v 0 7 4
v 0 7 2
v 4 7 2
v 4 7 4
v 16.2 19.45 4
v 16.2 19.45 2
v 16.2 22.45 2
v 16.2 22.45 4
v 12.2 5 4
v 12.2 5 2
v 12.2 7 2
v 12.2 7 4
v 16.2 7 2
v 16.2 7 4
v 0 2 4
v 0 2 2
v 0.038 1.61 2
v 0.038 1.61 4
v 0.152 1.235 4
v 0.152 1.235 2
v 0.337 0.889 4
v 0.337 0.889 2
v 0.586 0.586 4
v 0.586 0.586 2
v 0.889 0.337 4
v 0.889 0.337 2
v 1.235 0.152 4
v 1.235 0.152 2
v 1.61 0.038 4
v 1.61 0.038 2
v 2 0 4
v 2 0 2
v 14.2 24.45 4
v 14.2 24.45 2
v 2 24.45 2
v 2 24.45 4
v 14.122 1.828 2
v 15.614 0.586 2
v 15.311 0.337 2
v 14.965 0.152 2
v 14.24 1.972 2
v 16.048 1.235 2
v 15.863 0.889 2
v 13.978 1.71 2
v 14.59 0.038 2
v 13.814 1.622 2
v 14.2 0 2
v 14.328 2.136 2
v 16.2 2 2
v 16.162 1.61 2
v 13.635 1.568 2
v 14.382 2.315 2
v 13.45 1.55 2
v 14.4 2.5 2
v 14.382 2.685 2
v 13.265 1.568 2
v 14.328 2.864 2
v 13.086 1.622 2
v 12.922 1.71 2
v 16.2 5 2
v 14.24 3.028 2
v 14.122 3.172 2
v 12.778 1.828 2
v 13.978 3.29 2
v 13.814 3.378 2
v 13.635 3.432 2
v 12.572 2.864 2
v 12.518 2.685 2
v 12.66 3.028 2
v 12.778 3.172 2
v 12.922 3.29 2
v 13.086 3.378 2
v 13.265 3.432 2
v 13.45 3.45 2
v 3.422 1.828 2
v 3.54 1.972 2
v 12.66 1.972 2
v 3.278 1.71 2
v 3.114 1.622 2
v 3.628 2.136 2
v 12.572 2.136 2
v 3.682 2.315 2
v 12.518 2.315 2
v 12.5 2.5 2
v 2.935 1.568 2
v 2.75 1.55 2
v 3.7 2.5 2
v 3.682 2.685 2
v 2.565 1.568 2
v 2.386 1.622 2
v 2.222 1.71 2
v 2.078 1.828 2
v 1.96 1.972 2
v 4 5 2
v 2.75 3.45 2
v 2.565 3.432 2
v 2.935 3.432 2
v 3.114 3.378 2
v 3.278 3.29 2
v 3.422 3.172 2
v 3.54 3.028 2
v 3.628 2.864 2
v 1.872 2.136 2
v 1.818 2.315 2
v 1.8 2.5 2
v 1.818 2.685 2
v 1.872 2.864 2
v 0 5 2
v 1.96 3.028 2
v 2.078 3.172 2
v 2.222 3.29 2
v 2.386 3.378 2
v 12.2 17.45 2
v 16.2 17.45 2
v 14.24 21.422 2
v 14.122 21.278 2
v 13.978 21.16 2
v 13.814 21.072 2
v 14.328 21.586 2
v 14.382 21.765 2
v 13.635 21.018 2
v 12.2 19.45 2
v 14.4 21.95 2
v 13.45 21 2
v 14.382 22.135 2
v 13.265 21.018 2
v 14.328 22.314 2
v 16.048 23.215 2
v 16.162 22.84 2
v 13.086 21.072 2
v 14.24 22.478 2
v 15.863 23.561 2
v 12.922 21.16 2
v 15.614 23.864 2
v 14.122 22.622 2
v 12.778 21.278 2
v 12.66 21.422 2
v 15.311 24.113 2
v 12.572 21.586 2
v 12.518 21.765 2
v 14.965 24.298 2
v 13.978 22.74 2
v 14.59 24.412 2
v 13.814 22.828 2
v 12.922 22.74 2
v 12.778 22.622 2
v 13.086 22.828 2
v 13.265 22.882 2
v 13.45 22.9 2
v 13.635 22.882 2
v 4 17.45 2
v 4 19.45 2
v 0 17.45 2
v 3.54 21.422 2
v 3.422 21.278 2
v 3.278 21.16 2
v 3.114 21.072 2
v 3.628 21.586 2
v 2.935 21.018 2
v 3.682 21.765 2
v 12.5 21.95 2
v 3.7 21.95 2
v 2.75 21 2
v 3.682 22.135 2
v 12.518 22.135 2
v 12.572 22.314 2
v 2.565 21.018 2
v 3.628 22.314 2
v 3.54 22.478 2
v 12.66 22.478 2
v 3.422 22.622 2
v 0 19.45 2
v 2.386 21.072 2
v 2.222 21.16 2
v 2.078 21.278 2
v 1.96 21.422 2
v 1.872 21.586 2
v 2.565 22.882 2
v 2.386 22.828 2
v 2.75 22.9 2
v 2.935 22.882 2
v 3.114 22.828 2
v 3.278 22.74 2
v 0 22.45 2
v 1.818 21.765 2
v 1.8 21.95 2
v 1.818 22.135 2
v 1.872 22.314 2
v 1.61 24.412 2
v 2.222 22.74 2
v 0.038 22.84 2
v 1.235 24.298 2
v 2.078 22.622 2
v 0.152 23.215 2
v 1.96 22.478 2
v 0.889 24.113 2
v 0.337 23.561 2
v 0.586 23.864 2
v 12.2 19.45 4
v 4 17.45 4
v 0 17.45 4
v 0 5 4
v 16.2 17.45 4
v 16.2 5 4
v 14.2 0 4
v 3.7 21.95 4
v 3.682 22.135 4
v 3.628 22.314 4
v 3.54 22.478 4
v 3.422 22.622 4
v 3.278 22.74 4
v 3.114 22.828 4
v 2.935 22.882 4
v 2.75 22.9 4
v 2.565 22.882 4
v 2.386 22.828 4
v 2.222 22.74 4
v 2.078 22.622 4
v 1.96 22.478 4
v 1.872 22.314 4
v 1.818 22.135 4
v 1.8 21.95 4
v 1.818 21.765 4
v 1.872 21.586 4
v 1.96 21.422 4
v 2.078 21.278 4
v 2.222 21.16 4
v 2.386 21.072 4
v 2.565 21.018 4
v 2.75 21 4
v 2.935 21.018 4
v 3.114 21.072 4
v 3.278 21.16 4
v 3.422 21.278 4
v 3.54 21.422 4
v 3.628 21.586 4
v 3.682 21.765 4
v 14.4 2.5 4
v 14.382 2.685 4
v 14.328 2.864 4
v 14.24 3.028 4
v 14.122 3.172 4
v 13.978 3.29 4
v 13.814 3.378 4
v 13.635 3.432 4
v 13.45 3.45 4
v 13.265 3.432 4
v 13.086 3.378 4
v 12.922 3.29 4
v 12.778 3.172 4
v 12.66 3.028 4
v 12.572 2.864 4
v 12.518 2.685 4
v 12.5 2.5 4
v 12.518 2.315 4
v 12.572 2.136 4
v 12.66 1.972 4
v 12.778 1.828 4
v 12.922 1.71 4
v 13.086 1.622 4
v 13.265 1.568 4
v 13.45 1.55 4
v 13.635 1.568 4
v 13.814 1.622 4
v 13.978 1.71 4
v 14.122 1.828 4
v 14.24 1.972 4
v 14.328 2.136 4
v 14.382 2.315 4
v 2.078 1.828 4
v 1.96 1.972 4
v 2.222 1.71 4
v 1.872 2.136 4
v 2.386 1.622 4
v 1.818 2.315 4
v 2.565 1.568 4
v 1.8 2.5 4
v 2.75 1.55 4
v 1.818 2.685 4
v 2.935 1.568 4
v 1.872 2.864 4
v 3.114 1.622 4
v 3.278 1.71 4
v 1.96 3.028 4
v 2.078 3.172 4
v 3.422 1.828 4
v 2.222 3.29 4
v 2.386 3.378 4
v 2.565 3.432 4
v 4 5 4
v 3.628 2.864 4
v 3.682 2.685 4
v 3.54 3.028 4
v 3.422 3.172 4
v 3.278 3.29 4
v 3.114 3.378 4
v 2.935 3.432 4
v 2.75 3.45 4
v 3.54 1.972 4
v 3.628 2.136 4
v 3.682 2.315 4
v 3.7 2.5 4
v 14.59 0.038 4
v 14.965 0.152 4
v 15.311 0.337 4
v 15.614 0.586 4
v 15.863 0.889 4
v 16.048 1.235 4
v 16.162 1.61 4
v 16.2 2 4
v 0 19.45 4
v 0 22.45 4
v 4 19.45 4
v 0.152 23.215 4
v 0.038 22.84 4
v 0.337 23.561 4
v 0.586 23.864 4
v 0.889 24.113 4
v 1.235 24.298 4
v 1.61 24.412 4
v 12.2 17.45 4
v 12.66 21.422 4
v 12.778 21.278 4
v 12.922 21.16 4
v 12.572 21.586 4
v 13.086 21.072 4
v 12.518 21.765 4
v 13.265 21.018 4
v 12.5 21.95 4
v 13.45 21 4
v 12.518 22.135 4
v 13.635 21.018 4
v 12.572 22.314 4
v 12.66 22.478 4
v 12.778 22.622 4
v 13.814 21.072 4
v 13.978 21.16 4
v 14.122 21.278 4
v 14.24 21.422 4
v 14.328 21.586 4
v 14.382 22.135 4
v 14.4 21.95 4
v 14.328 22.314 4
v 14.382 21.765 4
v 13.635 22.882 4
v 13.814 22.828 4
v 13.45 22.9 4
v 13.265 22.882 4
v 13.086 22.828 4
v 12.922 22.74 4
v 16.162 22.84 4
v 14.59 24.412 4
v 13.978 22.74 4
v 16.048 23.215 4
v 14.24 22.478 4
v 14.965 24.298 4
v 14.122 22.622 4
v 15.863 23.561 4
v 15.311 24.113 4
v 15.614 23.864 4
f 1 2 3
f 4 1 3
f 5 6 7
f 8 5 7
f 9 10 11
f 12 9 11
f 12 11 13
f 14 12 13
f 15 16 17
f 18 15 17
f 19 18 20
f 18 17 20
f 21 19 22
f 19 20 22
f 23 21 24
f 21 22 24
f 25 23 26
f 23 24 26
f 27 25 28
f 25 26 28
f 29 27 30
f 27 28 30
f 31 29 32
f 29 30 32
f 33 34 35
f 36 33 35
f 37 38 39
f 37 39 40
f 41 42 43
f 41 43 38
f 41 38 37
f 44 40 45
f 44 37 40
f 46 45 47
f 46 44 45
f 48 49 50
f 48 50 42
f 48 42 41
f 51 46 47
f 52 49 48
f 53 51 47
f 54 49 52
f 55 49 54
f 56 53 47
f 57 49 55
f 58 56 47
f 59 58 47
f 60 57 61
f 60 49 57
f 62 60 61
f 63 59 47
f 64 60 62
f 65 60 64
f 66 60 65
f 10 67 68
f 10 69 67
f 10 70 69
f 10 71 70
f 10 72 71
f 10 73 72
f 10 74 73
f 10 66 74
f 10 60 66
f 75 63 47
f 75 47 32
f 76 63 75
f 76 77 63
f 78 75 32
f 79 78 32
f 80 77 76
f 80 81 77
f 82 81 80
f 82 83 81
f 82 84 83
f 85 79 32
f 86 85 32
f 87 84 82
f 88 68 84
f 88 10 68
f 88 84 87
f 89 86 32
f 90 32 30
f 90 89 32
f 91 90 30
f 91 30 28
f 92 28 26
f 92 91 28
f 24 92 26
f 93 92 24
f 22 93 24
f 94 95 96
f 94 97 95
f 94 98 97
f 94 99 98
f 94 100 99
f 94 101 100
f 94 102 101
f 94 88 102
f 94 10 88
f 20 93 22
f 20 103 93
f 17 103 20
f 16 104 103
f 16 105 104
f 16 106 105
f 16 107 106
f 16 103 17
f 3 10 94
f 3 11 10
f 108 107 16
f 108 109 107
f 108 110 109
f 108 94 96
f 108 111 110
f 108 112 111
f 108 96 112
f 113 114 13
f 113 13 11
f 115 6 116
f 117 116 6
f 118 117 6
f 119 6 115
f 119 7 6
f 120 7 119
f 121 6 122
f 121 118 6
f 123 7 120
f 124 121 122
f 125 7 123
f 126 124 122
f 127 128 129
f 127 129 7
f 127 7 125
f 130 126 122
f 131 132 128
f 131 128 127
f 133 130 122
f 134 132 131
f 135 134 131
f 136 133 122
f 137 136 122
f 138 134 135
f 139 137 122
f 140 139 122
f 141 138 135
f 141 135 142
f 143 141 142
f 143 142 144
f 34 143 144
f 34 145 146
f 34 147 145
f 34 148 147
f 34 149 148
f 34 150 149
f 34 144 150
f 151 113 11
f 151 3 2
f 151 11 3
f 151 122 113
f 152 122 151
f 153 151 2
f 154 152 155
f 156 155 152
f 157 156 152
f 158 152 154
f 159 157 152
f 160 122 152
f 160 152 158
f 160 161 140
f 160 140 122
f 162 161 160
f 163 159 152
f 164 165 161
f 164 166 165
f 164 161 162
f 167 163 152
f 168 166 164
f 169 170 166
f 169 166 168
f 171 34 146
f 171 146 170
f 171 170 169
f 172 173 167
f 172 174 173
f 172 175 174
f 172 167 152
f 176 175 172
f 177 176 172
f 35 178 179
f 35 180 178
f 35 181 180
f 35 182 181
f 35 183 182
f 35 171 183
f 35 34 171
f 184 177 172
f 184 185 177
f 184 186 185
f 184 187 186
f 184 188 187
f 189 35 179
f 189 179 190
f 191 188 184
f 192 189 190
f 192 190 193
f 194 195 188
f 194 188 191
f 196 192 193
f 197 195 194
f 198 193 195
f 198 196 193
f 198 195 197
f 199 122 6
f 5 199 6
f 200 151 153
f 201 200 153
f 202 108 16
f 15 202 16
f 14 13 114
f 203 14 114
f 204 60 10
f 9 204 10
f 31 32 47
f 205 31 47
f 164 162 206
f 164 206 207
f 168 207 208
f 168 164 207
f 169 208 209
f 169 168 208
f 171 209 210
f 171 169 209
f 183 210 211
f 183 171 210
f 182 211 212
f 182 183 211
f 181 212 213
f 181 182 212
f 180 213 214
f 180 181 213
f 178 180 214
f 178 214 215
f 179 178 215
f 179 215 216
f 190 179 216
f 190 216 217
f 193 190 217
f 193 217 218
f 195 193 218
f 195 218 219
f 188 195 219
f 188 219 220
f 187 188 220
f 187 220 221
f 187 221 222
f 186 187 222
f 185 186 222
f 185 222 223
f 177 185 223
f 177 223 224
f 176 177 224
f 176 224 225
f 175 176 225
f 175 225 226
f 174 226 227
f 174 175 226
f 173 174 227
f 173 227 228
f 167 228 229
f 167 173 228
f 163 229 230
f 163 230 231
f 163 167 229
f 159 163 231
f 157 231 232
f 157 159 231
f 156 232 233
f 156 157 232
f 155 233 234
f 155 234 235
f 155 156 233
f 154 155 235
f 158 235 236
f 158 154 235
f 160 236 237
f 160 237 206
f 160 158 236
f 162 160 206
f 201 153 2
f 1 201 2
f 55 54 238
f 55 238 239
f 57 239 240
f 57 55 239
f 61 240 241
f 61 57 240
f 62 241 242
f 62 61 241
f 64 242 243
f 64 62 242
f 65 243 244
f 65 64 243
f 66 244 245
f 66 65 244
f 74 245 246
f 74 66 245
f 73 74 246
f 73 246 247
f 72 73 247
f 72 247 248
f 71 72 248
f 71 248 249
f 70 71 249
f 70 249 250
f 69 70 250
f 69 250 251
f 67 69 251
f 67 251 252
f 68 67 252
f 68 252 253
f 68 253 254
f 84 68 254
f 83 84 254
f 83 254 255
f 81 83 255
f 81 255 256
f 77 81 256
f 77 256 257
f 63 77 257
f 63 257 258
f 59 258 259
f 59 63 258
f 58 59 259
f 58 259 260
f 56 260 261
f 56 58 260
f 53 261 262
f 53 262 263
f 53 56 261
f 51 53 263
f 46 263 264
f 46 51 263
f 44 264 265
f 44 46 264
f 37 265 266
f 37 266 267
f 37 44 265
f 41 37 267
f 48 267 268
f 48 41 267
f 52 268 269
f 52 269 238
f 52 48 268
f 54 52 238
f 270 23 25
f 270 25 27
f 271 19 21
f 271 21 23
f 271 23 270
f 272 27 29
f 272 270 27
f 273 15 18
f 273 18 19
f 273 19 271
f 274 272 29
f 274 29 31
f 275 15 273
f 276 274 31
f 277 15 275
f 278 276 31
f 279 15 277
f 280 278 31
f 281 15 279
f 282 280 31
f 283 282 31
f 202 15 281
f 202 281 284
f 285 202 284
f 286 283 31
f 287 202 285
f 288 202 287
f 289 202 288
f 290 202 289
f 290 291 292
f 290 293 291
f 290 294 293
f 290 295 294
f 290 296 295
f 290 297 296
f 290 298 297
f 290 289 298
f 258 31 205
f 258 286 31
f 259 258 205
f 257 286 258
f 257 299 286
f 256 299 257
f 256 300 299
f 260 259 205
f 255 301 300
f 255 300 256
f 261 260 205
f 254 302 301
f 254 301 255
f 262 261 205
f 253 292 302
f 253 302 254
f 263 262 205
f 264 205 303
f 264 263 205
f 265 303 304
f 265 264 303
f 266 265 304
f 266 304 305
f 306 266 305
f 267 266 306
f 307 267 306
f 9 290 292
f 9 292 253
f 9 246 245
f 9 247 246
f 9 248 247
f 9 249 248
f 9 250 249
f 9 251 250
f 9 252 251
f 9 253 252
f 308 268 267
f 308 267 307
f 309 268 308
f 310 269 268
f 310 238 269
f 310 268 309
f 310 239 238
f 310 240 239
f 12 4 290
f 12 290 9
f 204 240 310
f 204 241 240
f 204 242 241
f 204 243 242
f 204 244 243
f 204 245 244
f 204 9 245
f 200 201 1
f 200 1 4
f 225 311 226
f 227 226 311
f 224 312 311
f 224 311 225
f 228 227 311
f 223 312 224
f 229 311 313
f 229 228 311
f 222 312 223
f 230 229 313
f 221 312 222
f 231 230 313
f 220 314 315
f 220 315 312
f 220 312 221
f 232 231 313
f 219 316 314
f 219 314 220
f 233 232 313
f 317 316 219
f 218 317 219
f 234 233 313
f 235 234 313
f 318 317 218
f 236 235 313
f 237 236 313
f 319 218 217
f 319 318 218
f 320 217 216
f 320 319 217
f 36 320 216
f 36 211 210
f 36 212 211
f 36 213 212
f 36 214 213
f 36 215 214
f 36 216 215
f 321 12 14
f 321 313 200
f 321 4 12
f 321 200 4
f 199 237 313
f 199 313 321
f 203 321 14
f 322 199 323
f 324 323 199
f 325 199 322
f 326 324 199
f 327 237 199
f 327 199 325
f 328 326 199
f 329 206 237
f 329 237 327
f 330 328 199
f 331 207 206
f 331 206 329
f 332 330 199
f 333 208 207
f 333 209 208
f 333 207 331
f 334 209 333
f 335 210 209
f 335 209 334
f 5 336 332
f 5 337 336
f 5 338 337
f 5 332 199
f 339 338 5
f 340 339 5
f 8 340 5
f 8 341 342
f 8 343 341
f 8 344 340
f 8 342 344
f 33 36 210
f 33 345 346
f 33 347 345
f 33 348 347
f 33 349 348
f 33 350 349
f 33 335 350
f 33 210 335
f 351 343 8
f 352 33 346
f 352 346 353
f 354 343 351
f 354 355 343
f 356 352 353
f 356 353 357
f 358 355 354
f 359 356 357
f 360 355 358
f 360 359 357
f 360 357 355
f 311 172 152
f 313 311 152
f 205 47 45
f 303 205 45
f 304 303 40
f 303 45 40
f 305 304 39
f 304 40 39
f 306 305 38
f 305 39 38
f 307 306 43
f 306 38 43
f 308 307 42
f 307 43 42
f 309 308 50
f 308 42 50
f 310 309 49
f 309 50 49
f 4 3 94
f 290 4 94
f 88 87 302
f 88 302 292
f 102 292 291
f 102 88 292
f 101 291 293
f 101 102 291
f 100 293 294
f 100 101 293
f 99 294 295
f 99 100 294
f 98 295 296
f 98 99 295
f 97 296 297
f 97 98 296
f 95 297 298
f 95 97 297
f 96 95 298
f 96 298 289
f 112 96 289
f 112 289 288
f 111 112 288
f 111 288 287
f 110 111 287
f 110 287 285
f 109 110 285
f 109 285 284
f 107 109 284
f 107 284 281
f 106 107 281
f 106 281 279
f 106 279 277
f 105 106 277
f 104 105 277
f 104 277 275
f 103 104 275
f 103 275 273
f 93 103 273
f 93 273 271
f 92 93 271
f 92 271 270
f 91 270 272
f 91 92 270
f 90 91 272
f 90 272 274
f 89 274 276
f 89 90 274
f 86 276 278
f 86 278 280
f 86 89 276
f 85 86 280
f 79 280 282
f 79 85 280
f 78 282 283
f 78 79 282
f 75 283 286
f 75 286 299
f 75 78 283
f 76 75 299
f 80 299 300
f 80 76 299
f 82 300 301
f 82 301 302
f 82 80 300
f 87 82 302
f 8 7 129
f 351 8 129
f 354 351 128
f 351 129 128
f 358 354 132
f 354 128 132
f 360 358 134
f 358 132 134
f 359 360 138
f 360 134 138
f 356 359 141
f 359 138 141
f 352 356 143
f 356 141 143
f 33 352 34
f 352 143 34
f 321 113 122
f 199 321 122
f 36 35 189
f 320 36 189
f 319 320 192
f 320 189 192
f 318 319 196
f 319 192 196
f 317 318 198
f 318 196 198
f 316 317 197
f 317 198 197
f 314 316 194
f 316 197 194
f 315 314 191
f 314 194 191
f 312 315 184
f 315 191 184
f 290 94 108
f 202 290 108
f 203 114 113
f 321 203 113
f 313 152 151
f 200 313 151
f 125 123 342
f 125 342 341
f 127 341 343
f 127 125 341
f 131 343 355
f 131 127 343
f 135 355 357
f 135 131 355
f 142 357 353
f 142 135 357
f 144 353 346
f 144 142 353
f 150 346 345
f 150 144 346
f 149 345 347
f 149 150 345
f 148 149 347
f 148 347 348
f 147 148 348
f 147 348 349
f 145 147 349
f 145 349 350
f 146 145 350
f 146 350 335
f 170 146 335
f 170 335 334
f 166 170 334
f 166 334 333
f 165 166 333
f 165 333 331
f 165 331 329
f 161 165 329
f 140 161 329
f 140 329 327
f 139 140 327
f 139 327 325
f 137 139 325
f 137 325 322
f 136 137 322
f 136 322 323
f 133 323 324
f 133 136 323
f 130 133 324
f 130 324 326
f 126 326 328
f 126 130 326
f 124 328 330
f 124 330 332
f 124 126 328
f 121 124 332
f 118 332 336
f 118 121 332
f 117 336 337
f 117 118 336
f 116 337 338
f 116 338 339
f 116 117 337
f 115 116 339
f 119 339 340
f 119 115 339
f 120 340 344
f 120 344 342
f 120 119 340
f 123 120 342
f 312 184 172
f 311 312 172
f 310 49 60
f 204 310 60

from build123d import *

# Parameters (mm, degrees)
SKETCH1_R           = 0.95
BOSS_EXTRUDE1_DEPTH = 4
SKETCH2_W           = 16.2
SKETCH2_H           = 24.45
CUT_EXTRUDE1_DEPTH  = 2


with BuildPart() as part:
    # Sketch1 → Boss-Extrude1 (new body)
    with BuildSketch(Plane.XY):
        with BuildLine():
            Line((0, 17.45), (0, 7))
            Line((0, 7), (4, 7))
            Line((4, 7), (4, 5))
            Line((4, 5), (0, 5))
            Line((0, 5), (0, 2))
            ThreePointArc((0, 2), (0.585786438, 0.585786438), (2, 0))
            Line((2, 0), (14.2, 0))
            ThreePointArc((14.2, 0), (15.614213562, 0.585786438), (16.2, 2))
            Line((16.2, 2), (16.2, 5))
            Line((16.2, 5), (12.2, 5))
            Line((12.2, 5), (12.2, 7))
            Line((12.2, 7), (16.2, 7))
            Line((16.2, 7), (16.2, 17.45))
            Line((16.2, 17.45), (12.2, 17.45))
            Line((12.2, 17.45), (12.2, 19.45))
            Line((12.2, 19.45), (16.2, 19.45))
            Line((16.2, 19.45), (16.2, 22.45))
            ThreePointArc((16.2, 22.45), (15.614213562, 23.864213562), (14.2, 24.45))
            Line((14.2, 24.45), (2, 24.45))
            ThreePointArc((2, 24.45), (0.585786438, 23.864213562), (0, 22.45))
            Line((0, 22.45), (0, 19.45))
            Line((0, 19.45), (4, 19.45))
            Line((4, 19.45), (4, 17.45))
            Line((4, 17.45), (0, 17.45))
        make_face()
        with Locations((13.45, 2.5)):
            Circle(SKETCH1_R, mode=Mode.SUBTRACT)
        with Locations((2.75, 21.95)):
            Circle(SKETCH1_R, mode=Mode.SUBTRACT)
        with Locations((2.75, 2.5)):
            Circle(SKETCH1_R, mode=Mode.SUBTRACT)
        with Locations((13.45, 21.95)):
            Circle(SKETCH1_R, mode=Mode.SUBTRACT)
    extrude(amount=BOSS_EXTRUDE1_DEPTH)

    # Sketch2 → Cut-Extrude1 (cut)
    with BuildSketch(Plane(origin=(0, 0, 0), x_dir=(-1, 0, 0), z_dir=(0, 0, -1))):
        with Locations((-8.1, 12.225)):
            Rectangle(SKETCH2_W, SKETCH2_H)
    extrude(amount=-CUT_EXTRUDE1_DEPTH, mode=Mode.SUBTRACT)


solid = part.part
